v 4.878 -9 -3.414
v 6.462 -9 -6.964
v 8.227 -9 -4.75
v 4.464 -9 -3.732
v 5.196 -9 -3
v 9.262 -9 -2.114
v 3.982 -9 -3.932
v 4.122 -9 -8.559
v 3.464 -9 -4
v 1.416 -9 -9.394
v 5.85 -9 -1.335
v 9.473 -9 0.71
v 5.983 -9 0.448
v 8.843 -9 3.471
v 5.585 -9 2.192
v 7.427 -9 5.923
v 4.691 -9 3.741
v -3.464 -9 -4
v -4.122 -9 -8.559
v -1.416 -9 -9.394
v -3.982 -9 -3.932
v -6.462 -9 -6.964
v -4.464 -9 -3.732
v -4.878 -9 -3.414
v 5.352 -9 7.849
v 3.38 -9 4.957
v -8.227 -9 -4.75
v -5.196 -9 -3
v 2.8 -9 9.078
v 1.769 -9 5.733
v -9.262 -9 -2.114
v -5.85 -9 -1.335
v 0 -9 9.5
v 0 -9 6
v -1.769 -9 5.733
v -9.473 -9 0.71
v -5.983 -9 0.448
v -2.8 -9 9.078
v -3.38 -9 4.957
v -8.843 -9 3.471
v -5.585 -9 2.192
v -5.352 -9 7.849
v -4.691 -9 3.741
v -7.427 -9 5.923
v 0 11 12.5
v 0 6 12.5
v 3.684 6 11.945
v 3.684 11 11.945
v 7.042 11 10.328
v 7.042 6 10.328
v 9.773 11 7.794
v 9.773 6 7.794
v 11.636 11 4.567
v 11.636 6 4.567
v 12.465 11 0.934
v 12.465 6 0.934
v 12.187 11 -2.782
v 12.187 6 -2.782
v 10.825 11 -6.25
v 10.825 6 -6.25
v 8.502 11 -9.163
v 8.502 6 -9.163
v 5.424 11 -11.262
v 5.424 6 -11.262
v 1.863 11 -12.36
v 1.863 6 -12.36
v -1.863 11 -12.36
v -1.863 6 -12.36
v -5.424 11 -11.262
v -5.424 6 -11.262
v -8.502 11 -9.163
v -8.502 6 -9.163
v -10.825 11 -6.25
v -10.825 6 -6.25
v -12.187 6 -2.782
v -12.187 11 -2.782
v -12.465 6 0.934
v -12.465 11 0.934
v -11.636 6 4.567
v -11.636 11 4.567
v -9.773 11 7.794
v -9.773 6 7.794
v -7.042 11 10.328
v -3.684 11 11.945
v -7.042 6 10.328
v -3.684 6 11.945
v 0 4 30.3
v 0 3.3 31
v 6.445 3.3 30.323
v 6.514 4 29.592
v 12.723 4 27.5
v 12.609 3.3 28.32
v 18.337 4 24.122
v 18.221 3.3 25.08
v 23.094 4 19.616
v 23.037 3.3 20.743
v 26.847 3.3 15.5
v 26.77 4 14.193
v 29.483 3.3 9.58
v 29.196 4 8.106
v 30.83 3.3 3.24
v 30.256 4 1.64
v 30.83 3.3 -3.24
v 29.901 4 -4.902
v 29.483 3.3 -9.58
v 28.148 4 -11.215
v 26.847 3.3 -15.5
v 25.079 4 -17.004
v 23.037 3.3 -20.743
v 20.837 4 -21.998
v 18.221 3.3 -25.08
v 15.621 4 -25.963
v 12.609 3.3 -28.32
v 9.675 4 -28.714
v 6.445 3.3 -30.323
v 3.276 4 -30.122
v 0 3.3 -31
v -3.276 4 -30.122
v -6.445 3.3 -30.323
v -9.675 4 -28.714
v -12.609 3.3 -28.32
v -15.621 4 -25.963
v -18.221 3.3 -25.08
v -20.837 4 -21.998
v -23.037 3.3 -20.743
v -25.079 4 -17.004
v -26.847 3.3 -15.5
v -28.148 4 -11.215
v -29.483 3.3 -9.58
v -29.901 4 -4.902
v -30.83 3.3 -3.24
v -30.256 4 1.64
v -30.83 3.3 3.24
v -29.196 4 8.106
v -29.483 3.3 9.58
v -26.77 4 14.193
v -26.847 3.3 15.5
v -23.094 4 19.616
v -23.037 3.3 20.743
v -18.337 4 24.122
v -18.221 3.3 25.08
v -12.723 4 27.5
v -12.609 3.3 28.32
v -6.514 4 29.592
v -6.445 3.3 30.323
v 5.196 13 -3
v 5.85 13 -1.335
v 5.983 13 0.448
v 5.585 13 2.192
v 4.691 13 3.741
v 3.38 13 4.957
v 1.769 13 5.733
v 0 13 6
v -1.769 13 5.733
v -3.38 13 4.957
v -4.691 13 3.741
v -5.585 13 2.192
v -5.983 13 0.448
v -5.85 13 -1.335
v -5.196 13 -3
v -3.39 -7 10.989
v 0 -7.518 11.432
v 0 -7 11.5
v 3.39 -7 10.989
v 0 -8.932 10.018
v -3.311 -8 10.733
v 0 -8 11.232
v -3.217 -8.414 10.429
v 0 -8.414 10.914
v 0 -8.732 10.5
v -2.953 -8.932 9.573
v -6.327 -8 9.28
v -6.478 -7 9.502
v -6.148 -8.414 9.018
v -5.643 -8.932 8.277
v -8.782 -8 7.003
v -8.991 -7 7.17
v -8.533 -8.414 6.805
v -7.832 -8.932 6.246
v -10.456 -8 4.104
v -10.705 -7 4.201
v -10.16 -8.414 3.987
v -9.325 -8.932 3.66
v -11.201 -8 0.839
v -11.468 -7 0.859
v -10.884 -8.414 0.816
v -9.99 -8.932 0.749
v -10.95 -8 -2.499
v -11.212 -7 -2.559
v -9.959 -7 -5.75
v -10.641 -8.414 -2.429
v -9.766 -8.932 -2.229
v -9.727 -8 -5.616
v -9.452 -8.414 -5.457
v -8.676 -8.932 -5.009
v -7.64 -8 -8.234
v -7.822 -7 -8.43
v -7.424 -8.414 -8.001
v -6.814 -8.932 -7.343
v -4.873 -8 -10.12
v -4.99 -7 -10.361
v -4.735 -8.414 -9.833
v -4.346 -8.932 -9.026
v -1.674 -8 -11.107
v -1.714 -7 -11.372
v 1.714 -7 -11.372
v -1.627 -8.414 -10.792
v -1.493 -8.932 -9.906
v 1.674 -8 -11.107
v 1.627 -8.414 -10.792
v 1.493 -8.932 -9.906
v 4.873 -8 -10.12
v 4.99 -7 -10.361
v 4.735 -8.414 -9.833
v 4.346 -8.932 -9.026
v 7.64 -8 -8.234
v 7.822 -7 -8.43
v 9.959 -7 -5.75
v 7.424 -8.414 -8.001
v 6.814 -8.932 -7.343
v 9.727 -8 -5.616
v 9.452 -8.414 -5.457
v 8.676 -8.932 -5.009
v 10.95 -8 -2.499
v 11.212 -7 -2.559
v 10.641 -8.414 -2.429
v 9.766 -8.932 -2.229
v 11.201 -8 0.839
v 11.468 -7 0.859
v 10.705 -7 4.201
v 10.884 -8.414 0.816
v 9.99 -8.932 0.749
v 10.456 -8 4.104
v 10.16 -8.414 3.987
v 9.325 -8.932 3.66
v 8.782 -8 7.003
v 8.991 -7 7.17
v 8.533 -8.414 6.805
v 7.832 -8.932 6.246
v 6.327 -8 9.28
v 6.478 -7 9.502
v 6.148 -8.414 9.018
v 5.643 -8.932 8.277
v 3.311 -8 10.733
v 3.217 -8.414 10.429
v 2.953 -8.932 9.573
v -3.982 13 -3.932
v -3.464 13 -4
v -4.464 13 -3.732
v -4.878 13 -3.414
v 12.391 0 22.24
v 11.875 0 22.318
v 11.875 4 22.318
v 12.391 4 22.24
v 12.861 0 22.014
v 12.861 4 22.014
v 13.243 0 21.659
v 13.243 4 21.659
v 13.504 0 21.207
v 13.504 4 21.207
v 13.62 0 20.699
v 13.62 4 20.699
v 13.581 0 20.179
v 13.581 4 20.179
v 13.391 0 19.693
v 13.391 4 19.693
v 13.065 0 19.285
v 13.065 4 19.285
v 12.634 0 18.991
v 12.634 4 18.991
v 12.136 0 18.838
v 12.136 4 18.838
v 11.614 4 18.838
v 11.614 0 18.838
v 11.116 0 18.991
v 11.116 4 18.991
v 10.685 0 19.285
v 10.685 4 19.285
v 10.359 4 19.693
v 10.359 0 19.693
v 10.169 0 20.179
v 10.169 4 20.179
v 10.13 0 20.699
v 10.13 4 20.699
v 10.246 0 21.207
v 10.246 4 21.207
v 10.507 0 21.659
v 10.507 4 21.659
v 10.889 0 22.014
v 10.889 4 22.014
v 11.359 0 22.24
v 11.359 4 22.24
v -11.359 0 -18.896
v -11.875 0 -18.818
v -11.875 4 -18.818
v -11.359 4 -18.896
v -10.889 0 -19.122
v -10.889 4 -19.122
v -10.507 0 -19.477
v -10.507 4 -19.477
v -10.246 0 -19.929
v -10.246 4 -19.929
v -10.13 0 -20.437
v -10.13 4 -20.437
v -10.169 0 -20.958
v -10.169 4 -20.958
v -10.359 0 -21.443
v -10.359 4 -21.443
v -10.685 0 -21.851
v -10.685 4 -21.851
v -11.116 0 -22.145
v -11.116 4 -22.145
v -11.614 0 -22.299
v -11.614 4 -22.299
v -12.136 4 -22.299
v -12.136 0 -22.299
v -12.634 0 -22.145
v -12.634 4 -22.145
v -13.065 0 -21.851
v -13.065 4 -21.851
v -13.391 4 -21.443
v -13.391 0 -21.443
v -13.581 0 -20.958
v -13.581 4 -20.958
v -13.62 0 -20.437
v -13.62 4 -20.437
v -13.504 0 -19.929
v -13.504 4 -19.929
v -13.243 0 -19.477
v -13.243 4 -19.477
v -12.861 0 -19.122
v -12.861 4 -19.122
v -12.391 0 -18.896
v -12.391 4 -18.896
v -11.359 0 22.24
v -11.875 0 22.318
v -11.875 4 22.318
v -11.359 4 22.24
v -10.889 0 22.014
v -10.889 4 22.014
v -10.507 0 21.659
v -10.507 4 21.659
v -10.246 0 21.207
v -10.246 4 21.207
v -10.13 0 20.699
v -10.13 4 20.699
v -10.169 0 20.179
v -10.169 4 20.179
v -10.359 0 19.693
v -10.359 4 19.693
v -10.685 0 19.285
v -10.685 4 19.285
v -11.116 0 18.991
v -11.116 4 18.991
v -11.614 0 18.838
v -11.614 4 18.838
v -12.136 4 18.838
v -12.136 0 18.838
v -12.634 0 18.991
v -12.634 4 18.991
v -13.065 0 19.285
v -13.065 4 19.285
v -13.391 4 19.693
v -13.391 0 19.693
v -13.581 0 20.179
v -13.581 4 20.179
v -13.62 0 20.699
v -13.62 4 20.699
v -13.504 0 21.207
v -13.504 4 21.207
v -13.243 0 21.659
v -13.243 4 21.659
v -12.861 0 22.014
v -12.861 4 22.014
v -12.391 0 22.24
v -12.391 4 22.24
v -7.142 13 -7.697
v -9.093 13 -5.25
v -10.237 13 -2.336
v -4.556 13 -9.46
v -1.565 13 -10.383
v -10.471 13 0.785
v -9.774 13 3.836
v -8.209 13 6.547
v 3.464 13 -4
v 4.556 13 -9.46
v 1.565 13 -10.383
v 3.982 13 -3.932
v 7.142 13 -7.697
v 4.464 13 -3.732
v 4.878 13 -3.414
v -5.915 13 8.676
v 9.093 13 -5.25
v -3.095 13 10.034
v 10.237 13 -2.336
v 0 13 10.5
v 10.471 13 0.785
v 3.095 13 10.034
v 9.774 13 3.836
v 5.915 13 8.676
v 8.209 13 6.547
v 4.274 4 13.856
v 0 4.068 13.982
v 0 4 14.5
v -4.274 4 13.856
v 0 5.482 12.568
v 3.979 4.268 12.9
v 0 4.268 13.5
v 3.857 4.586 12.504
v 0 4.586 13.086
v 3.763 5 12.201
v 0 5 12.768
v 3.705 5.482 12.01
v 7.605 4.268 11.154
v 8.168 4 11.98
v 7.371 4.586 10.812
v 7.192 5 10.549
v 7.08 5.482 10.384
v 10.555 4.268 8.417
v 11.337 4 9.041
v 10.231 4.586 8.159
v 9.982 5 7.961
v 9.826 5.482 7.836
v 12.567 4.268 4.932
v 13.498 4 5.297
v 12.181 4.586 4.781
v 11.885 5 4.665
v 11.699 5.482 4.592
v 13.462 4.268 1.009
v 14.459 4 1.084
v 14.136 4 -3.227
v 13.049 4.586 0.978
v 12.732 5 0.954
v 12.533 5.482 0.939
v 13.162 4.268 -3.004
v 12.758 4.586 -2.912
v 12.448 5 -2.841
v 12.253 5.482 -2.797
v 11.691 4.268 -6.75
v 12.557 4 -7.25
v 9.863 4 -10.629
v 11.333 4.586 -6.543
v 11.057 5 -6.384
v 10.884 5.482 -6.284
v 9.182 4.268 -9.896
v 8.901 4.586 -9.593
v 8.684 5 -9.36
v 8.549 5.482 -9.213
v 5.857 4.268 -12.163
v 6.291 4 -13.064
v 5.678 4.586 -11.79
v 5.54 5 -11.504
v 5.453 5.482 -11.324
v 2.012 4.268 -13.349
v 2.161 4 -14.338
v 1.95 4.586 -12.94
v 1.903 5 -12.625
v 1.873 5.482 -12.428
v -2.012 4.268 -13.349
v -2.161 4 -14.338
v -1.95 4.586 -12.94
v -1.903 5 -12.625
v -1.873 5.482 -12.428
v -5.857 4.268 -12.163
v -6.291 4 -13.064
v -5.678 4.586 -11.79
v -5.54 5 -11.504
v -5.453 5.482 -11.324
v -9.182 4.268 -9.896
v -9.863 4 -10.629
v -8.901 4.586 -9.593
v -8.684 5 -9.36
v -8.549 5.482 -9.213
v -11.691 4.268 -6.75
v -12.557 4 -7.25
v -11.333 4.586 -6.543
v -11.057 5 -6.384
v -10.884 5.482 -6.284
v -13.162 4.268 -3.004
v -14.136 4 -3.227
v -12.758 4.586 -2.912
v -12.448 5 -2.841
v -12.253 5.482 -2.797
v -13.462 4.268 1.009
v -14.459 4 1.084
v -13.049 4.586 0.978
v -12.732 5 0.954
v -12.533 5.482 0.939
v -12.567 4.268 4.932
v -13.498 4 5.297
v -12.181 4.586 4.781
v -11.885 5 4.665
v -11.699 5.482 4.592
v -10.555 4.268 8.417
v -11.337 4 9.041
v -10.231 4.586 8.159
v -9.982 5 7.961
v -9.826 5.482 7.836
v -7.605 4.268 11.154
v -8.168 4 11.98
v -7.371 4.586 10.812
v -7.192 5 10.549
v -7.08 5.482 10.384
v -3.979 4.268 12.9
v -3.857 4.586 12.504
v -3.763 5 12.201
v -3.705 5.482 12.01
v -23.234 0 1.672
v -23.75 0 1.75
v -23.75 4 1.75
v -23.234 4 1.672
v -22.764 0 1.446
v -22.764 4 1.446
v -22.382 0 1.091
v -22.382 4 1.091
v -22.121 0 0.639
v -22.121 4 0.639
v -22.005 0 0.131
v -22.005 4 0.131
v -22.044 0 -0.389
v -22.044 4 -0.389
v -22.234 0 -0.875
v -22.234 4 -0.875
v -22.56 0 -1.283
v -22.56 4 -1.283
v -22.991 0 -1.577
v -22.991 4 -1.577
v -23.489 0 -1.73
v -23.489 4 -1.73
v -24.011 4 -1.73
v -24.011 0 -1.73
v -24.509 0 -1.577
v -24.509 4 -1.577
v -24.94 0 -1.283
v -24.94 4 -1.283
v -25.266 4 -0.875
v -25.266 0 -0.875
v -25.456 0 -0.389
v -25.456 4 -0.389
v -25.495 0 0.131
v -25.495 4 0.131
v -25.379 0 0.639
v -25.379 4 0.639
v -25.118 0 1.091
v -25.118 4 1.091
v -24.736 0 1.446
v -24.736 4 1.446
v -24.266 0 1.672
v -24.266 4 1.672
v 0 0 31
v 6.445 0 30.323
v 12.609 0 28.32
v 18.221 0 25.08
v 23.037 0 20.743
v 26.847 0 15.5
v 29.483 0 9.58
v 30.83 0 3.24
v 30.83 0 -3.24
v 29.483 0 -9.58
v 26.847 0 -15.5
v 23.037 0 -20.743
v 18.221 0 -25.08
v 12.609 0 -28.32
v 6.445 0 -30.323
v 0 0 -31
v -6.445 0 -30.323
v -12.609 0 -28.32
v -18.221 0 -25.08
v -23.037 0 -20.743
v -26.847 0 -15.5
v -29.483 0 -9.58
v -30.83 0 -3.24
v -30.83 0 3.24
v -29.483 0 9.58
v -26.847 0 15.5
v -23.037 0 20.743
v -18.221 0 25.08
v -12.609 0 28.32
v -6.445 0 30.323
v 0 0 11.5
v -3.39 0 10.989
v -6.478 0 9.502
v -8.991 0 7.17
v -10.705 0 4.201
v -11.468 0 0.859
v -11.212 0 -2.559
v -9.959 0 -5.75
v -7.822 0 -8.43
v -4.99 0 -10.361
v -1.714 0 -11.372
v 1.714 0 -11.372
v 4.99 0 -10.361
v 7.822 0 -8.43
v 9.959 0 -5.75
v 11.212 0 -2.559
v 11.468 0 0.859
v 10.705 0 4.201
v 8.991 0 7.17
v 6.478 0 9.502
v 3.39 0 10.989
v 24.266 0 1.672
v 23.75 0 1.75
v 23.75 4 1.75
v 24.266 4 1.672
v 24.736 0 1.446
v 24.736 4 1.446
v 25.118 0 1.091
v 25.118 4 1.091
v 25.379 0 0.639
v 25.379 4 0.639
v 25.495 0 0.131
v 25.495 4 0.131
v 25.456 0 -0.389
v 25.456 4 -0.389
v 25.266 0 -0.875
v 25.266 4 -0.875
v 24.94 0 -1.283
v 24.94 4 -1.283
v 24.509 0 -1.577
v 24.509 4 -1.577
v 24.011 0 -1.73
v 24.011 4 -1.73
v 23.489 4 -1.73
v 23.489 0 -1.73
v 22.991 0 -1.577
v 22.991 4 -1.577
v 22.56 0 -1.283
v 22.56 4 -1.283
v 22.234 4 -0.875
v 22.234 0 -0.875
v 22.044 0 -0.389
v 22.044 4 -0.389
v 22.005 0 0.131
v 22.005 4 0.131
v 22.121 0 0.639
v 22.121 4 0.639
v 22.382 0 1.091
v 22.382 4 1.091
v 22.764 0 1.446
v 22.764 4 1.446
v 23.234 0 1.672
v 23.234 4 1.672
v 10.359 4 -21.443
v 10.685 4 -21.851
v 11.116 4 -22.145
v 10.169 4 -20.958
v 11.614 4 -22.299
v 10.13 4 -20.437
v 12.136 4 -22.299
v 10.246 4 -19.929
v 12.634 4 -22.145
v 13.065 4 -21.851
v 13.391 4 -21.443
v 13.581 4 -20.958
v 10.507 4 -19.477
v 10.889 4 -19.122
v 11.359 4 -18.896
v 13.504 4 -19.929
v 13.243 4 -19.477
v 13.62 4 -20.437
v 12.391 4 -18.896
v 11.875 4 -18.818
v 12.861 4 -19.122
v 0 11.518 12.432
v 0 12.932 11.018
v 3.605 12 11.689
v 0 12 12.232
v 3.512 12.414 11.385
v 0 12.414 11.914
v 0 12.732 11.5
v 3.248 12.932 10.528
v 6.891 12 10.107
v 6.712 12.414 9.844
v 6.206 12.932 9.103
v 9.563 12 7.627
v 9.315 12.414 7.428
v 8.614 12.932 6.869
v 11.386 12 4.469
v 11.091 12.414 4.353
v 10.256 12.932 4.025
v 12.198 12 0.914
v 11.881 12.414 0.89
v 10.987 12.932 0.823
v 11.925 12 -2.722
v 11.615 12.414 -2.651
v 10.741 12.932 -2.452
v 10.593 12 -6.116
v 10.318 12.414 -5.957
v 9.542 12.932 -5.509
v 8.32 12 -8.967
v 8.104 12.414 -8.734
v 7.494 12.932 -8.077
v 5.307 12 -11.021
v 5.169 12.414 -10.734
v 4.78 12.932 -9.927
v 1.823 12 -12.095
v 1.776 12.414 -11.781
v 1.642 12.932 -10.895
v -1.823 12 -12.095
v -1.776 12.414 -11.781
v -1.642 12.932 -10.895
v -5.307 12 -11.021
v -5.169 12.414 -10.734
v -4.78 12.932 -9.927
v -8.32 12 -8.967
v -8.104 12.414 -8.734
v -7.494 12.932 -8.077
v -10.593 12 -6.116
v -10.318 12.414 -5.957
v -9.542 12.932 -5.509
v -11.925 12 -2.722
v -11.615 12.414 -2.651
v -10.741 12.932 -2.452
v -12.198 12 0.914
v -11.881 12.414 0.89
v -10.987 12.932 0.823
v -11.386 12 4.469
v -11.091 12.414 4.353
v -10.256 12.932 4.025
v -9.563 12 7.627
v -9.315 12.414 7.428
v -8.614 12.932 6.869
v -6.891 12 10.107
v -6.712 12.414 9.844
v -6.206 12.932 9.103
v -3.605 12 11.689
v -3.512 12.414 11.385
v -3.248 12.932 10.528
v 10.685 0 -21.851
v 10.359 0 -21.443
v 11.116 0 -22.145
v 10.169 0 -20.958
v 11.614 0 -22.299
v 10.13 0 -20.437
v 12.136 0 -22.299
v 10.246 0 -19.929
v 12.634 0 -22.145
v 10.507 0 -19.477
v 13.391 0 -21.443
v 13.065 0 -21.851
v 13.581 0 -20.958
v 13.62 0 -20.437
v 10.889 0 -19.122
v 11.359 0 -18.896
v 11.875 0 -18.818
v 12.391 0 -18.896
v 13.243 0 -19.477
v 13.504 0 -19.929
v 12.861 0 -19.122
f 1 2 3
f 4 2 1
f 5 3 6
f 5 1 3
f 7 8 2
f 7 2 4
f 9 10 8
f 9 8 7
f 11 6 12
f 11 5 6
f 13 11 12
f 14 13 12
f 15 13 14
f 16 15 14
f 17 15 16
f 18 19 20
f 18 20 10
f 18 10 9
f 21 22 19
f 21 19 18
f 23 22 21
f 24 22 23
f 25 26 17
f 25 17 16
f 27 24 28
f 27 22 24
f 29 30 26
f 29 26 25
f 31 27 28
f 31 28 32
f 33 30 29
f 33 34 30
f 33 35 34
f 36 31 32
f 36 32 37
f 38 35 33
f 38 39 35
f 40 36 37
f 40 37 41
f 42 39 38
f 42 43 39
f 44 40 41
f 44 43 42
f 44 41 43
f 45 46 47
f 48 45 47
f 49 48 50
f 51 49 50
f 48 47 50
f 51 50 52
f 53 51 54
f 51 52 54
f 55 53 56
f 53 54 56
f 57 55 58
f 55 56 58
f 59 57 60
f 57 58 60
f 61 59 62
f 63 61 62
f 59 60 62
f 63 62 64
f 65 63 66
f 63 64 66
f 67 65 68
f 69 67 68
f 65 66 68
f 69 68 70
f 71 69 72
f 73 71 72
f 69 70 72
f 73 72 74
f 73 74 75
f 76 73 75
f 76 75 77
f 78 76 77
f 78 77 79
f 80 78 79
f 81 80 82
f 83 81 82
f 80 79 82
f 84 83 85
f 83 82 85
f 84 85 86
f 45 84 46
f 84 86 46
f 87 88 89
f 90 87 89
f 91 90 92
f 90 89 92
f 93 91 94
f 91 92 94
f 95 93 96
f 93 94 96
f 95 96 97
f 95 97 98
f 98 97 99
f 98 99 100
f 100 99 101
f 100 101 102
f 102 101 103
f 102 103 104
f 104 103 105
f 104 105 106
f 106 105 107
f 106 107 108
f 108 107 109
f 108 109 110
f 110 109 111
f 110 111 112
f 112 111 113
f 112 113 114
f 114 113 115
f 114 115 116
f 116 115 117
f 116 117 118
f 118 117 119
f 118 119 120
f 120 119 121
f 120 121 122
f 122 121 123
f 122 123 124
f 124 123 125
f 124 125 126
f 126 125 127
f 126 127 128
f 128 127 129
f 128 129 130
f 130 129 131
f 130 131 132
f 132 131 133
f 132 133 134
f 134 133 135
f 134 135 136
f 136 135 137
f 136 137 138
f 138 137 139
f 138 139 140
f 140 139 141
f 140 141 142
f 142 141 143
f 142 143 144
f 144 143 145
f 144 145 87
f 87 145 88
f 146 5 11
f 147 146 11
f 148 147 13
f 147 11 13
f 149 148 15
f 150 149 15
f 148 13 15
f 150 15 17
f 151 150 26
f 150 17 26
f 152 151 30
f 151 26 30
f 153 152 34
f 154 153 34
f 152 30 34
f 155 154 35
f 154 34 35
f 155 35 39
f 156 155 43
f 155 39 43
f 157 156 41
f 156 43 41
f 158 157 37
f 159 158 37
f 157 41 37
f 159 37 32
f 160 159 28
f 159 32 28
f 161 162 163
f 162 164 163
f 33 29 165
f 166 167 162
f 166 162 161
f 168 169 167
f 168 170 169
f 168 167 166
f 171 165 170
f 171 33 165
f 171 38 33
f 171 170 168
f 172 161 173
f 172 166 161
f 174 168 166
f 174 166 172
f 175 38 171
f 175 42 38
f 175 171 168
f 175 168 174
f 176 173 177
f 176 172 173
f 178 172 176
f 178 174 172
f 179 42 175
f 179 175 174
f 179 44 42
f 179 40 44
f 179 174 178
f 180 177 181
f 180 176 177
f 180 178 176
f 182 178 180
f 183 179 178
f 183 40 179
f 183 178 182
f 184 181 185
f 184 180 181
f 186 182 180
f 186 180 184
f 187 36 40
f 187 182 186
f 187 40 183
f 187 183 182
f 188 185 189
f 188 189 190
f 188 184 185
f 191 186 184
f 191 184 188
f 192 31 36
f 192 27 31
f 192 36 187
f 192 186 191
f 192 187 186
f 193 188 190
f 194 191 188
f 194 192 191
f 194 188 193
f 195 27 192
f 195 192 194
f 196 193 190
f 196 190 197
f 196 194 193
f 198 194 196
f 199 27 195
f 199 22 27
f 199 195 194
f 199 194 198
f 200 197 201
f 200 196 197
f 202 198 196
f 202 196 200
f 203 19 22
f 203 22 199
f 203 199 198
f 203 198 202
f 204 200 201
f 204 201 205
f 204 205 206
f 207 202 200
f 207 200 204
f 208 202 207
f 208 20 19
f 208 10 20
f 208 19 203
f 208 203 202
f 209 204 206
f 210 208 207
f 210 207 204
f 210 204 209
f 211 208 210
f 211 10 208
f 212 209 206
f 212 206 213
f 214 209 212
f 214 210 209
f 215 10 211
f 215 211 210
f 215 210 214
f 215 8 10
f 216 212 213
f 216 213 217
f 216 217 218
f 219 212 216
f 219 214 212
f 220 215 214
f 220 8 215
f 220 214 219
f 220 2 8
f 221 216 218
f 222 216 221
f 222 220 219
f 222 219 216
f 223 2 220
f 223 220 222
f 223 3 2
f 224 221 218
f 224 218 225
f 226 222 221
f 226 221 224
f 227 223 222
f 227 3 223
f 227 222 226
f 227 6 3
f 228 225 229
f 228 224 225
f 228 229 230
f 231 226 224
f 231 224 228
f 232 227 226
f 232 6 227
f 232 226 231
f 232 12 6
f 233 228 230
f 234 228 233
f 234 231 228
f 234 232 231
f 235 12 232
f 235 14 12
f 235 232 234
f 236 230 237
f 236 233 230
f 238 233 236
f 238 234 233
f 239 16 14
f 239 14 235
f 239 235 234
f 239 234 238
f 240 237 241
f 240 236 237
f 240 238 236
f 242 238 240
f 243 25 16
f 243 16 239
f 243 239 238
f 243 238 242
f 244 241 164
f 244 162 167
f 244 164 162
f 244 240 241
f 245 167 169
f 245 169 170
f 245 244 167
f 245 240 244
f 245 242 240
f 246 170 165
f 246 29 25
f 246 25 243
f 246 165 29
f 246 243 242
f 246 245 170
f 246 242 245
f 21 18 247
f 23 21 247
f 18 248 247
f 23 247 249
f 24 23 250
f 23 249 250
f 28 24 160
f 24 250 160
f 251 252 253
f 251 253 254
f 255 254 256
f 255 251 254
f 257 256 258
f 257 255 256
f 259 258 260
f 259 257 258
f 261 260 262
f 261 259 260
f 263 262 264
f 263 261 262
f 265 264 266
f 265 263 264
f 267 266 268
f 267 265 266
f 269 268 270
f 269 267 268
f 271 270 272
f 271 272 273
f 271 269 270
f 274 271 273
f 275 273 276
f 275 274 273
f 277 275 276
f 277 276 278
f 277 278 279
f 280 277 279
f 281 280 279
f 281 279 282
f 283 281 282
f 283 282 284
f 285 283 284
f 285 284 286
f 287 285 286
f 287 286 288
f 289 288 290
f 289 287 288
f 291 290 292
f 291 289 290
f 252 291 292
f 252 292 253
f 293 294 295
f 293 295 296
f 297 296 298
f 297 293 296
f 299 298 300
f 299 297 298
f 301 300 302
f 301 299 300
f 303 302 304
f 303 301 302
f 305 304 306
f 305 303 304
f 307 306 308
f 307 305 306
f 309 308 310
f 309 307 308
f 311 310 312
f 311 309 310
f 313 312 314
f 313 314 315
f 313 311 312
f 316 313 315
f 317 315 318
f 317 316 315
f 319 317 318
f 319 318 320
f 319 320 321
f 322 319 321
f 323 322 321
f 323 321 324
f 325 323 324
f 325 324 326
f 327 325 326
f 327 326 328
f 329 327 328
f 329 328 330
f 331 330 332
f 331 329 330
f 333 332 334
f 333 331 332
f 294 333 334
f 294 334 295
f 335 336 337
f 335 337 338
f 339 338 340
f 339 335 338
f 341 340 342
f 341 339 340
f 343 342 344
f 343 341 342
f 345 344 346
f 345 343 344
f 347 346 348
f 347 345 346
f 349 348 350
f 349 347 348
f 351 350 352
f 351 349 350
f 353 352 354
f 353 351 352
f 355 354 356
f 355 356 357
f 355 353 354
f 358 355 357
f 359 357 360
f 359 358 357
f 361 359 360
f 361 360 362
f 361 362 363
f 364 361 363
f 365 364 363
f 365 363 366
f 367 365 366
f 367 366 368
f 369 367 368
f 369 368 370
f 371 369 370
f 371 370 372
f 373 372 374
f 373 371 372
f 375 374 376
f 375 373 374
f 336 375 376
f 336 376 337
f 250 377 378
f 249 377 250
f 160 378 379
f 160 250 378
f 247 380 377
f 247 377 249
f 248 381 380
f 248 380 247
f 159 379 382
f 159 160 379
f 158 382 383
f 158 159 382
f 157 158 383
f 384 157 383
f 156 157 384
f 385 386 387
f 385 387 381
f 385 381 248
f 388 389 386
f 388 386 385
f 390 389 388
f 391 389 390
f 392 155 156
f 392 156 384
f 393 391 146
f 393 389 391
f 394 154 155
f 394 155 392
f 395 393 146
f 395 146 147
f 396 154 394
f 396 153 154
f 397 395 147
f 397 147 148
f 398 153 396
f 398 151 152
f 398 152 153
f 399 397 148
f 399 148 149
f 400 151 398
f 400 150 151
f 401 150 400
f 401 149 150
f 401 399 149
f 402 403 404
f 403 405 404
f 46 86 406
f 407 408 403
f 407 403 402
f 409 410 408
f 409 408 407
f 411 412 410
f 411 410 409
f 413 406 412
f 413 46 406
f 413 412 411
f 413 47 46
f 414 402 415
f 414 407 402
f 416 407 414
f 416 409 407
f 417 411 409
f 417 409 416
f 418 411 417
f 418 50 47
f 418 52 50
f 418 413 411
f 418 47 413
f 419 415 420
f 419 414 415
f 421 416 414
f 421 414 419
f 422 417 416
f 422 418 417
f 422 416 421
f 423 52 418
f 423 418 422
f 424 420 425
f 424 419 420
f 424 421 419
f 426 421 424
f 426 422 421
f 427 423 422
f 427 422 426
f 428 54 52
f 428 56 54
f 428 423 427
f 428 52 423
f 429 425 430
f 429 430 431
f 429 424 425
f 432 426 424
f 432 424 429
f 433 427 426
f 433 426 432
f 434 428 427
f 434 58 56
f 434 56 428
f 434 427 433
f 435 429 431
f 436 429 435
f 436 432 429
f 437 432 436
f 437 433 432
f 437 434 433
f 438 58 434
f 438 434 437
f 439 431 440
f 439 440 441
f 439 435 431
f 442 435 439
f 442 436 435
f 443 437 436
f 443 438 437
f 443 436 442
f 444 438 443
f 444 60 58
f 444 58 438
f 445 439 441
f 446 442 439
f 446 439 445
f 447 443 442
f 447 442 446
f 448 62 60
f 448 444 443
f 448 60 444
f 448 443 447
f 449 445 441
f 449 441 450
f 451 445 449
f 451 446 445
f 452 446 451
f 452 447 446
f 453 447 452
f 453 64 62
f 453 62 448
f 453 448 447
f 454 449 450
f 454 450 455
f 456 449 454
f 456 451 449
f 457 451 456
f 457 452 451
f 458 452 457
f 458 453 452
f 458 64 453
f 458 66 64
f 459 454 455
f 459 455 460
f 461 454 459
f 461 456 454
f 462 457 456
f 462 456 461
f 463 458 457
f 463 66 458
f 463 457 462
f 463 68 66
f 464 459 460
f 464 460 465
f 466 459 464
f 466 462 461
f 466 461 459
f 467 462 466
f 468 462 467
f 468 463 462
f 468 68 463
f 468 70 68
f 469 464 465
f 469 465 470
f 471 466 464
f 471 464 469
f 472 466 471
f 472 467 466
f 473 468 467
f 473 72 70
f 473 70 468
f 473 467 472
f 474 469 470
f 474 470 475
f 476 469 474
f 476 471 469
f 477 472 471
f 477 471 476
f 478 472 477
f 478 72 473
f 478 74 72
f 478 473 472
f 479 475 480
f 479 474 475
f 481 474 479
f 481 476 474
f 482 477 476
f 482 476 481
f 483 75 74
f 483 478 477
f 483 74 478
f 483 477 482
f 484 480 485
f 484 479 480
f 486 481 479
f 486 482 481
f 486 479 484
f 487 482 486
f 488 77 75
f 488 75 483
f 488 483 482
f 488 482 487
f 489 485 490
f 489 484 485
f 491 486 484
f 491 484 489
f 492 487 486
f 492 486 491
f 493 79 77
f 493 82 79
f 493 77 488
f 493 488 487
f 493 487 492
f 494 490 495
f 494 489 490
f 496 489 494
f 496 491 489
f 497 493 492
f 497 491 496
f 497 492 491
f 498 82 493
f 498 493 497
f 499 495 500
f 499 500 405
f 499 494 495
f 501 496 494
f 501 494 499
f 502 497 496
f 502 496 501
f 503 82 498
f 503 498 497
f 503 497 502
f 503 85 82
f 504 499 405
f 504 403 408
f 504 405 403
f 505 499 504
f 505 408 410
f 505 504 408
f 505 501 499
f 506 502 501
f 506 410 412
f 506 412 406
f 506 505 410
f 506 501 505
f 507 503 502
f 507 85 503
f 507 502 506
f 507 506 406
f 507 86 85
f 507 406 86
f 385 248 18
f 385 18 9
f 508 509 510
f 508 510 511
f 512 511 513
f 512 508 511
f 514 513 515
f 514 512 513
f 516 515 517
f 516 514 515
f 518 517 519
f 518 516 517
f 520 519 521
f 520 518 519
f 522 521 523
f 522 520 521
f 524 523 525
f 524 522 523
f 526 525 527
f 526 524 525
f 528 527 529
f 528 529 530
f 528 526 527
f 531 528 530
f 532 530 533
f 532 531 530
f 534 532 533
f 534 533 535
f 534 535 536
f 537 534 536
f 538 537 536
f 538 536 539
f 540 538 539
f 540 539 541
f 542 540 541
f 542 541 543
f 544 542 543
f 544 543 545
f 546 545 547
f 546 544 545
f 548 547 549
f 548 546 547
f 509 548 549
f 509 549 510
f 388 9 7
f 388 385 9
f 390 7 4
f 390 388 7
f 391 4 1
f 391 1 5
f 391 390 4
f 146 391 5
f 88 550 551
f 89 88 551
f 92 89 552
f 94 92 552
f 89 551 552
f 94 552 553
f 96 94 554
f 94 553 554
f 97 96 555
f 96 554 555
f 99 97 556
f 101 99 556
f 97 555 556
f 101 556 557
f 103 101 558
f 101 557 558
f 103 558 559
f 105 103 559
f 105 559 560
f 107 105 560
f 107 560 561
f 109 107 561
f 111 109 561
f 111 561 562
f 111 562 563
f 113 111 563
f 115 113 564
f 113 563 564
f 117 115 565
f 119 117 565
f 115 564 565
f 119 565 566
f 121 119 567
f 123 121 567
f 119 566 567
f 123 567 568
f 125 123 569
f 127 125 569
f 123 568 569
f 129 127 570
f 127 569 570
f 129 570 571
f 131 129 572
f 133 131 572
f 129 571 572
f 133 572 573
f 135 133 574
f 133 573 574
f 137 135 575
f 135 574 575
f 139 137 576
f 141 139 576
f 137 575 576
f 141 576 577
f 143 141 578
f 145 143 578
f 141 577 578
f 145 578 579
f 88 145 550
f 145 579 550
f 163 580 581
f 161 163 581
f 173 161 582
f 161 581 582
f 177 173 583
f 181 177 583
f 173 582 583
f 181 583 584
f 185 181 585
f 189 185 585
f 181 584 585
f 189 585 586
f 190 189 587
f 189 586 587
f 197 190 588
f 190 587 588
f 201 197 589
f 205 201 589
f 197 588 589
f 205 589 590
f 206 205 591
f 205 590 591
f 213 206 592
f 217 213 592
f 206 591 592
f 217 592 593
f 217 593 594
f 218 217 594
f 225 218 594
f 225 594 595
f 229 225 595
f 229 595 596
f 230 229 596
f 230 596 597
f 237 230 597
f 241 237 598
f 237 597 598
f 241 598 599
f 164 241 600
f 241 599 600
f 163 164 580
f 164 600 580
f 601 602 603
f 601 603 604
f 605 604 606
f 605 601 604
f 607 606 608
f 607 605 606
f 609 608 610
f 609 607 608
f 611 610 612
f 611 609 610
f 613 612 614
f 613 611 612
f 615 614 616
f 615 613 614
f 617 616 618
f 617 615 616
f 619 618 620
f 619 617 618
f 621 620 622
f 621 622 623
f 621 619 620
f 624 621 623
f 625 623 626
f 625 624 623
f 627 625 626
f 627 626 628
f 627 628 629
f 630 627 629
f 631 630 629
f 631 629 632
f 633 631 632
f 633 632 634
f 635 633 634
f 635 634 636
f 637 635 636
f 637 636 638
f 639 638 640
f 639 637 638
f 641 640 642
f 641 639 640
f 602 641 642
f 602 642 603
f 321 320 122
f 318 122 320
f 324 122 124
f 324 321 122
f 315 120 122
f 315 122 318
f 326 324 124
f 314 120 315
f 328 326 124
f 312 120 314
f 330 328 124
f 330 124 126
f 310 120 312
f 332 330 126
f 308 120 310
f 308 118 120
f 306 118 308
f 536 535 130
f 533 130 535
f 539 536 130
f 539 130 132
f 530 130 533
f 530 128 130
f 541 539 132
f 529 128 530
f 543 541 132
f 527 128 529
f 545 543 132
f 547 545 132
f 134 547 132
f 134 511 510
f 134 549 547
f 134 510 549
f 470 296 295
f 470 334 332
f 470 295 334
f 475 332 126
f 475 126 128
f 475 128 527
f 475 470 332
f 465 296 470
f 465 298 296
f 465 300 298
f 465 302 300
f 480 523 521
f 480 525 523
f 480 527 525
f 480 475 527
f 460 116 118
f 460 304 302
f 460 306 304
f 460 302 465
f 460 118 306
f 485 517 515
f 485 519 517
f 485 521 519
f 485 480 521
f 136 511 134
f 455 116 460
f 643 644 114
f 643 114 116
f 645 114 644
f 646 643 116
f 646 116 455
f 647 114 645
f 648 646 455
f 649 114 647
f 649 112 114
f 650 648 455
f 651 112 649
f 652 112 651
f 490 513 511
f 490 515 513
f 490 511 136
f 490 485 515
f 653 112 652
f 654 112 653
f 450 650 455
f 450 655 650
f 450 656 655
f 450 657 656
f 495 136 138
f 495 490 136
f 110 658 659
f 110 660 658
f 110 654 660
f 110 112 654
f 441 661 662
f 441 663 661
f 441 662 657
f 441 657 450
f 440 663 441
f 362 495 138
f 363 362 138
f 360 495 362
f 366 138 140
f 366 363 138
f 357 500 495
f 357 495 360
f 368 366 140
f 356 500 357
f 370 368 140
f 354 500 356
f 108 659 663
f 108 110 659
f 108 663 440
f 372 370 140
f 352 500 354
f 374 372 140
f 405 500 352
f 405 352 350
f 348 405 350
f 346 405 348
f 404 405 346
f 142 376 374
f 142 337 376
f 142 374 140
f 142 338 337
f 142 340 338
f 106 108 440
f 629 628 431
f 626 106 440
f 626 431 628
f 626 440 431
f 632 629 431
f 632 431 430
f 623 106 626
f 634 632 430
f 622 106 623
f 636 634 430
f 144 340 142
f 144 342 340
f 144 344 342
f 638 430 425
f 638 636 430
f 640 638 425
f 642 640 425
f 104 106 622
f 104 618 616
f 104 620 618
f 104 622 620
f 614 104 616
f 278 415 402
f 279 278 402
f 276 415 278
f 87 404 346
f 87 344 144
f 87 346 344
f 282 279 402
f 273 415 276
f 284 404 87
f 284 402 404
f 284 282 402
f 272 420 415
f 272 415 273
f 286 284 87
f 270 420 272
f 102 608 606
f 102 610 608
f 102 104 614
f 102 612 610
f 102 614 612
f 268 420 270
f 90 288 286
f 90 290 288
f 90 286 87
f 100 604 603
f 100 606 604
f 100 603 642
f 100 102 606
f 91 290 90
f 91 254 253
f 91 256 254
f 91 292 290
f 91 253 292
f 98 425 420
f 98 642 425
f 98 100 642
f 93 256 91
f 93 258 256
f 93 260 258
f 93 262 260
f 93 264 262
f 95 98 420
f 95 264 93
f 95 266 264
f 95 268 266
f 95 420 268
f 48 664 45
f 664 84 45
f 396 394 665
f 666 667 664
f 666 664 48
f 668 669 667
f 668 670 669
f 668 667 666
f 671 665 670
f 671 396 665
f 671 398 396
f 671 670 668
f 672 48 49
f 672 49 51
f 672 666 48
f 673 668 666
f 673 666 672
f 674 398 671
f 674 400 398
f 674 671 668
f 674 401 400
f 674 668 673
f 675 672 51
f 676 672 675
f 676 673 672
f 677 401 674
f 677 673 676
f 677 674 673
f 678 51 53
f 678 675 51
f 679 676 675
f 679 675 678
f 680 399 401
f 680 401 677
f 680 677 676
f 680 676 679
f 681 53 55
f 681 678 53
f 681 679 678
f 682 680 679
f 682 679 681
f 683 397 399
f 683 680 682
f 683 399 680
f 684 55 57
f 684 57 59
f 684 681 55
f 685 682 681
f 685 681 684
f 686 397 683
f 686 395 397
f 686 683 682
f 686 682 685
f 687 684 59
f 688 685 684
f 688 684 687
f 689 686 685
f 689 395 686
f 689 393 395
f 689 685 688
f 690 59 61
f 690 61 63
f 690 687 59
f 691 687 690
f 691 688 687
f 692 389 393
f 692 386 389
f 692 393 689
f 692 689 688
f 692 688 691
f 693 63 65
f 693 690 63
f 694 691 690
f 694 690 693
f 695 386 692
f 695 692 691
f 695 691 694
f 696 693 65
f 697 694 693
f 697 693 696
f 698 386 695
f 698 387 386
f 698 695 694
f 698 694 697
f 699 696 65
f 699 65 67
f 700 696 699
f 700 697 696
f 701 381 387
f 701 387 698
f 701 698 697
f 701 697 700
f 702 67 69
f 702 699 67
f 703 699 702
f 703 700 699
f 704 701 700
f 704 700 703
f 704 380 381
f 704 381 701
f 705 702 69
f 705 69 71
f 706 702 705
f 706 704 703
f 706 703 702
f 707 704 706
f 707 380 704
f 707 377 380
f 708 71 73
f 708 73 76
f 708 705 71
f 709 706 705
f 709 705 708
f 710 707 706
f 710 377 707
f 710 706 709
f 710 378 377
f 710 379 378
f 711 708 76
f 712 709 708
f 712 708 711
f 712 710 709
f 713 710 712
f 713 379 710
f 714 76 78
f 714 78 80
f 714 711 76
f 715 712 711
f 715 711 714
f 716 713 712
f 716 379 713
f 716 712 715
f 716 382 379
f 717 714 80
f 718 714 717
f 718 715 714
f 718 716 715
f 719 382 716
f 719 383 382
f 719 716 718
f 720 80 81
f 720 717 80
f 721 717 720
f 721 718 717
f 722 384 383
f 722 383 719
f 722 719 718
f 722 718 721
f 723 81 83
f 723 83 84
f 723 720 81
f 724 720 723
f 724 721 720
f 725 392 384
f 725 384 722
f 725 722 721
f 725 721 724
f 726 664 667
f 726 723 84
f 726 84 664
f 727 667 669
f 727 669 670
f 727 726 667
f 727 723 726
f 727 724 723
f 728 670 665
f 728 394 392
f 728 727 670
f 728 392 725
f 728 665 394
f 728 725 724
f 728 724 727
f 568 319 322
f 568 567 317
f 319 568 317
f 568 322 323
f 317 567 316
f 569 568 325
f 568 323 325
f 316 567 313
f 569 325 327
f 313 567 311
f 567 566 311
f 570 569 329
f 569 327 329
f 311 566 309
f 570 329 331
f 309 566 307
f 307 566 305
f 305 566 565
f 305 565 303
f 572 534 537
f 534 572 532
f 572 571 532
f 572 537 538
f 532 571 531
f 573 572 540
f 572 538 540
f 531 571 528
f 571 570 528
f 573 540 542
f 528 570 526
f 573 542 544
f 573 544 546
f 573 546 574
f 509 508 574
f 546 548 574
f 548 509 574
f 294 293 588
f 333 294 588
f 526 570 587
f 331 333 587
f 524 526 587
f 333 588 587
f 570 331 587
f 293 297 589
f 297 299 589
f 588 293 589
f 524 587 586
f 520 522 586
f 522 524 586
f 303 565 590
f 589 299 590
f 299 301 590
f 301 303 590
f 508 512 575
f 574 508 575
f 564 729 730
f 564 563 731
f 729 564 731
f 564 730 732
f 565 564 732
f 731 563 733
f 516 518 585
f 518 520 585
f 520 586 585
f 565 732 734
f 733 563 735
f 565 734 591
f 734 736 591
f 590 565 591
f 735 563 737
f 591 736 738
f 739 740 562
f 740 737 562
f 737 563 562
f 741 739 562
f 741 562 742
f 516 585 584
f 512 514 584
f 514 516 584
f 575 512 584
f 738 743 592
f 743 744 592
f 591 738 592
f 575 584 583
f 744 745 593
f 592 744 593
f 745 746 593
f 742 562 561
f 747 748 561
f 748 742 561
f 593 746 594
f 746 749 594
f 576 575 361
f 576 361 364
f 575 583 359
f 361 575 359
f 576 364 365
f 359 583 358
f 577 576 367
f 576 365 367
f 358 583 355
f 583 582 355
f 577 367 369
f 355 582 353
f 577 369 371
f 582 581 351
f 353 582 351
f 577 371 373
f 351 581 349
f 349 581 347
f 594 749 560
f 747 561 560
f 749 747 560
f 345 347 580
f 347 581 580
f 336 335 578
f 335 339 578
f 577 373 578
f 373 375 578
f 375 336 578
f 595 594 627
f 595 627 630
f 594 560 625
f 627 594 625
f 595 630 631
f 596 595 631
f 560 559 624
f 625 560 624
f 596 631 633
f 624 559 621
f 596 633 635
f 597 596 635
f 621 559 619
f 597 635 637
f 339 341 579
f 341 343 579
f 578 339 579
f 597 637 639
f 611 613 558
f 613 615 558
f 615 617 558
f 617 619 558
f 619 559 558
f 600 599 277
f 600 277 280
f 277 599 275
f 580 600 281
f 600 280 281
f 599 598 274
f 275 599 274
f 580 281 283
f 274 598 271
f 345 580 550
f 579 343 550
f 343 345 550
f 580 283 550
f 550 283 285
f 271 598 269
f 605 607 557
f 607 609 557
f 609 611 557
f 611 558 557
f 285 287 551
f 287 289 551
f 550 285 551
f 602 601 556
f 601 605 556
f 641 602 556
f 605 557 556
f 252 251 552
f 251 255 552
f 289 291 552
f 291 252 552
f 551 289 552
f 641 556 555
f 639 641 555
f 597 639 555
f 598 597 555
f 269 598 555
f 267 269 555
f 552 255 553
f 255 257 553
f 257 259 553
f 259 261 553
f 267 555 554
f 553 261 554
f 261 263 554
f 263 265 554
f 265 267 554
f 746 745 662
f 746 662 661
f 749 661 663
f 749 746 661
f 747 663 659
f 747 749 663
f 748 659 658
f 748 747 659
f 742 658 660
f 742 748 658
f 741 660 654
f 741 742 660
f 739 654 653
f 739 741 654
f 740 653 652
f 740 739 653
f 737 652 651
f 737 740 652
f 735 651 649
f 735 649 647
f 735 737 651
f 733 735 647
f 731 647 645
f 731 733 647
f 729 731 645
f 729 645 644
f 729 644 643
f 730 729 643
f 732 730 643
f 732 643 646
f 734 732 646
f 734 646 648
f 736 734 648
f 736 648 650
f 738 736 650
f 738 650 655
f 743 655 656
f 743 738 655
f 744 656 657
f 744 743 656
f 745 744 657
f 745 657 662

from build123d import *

# Parameters (mm, degrees)
SKETCH1_R           = 31
SKETCH1_R_2         = 1.75
BOSS_EXTRUDE1_DEPTH = 4
SKETCH2_R           = 12.5
BOSS_EXTRUDE2_DEPTH = 9
FILLET2_R           = 2
CHAMFER2_SIZE       = 0.7
SKETCH6_R           = 11.5
BOSS_EXTRUDE3_DEPTH = 9
FILLET3_R           = 2
CUT_EXTRUDE3_DEPTH  = 50.050993874
FILLET4_R           = 2


with BuildPart() as part:
    # Sketch1 → Boss-Extrude1 (new body)
    with BuildSketch(Plane(origin=(0, 0, 0), x_dir=(1, 0, 0), z_dir=(0, 1, 0))):
        with Locations(Location((0, 0, 0), (0, 0, 270))):
            Circle(SKETCH1_R)
        with Locations(Location((-11.875, 20.56810334, 0), (0, 0, 270))):
            Circle(SKETCH1_R_2, mode=Mode.SUBTRACT)
        with Locations(Location((11.875, 20.56810334, 0), (0, 0, 270))):
            Circle(SKETCH1_R_2, mode=Mode.SUBTRACT)
        with Locations(Location((23.75, 0, 0), (0, 0, 270))):
            Circle(SKETCH1_R_2, mode=Mode.SUBTRACT)
        with Locations(Location((11.875, -20.56810334, 0), (0, 0, 270))):
            Circle(SKETCH1_R_2, mode=Mode.SUBTRACT)
        with Locations(Location((-11.875, -20.56810334, 0), (0, 0, 270))):
            Circle(SKETCH1_R_2, mode=Mode.SUBTRACT)
        with Locations(Location((-23.75, 0, 0), (0, 0, 270))):
            Circle(SKETCH1_R_2, mode=Mode.SUBTRACT)
    extrude(amount=BOSS_EXTRUDE1_DEPTH)

    # Sketch2 → Boss-Extrude2 (add)
    with BuildSketch(Plane(origin=(0, 4, 0), x_dir=(1, 0, 0), z_dir=(0, 1, 0))):
        with Locations(Location((0, 0, 0), (0, 0, 270))):
            Circle(SKETCH2_R)
    extrude(amount=BOSS_EXTRUDE2_DEPTH)

    # Fillet2
    fillet2_edges = [part.edges().sort_by_distance(p)[0] for p in [
        (0, 4, -12.5),
        (0, 13, -12.5),
    ]]
    fillet(fillet2_edges, radius=FILLET2_R)

    # Chamfer2
    chamfer2_edges = [part.edges().sort_by_distance(p)[0] for p in [
        (0, 4, -31),
    ]]
    chamfer(chamfer2_edges, length=CHAMFER2_SIZE)

    # Sketch6 → Boss-Extrude3 (add)
    with BuildSketch(Plane(origin=(0, 0, 0), x_dir=(-1, 0, 0), z_dir=(0, -1, 0))):
        with Locations(Location((0, 0, 0), (0, 0, 270))):
            Circle(SKETCH6_R)
    extrude(amount=BOSS_EXTRUDE3_DEPTH)

    # Fillet3
    fillet3_edges = [part.edges().sort_by_distance(p)[0] for p in [
        (0, -9, -11.5),
    ]]
    fillet(fillet3_edges, radius=FILLET3_R)

    # Sketch7 → Cut-Extrude3 (cut, through all)
    with BuildSketch(Plane(origin=(0, -9, 0), x_dir=(-1, 0, 0), z_dir=(0, -1, 0))):
        with BuildLine():
            Line((4.472135955, 4), (-4.472135955, 4))
            ThreePointArc((-4.472135955, 4), (0, -6), (4.472135955, 4))
        make_face()
    extrude(amount=-CUT_EXTRUDE3_DEPTH, mode=Mode.SUBTRACT)

    # Fillet4
    fillet4_edges = [part.edges().sort_by_distance(p)[0] for p in [
        (-4.472135955, 2, -4),
        (4.472135955, 2, -4),
    ]]
    fillet(fillet4_edges, radius=FILLET4_R)


solid = part.part
